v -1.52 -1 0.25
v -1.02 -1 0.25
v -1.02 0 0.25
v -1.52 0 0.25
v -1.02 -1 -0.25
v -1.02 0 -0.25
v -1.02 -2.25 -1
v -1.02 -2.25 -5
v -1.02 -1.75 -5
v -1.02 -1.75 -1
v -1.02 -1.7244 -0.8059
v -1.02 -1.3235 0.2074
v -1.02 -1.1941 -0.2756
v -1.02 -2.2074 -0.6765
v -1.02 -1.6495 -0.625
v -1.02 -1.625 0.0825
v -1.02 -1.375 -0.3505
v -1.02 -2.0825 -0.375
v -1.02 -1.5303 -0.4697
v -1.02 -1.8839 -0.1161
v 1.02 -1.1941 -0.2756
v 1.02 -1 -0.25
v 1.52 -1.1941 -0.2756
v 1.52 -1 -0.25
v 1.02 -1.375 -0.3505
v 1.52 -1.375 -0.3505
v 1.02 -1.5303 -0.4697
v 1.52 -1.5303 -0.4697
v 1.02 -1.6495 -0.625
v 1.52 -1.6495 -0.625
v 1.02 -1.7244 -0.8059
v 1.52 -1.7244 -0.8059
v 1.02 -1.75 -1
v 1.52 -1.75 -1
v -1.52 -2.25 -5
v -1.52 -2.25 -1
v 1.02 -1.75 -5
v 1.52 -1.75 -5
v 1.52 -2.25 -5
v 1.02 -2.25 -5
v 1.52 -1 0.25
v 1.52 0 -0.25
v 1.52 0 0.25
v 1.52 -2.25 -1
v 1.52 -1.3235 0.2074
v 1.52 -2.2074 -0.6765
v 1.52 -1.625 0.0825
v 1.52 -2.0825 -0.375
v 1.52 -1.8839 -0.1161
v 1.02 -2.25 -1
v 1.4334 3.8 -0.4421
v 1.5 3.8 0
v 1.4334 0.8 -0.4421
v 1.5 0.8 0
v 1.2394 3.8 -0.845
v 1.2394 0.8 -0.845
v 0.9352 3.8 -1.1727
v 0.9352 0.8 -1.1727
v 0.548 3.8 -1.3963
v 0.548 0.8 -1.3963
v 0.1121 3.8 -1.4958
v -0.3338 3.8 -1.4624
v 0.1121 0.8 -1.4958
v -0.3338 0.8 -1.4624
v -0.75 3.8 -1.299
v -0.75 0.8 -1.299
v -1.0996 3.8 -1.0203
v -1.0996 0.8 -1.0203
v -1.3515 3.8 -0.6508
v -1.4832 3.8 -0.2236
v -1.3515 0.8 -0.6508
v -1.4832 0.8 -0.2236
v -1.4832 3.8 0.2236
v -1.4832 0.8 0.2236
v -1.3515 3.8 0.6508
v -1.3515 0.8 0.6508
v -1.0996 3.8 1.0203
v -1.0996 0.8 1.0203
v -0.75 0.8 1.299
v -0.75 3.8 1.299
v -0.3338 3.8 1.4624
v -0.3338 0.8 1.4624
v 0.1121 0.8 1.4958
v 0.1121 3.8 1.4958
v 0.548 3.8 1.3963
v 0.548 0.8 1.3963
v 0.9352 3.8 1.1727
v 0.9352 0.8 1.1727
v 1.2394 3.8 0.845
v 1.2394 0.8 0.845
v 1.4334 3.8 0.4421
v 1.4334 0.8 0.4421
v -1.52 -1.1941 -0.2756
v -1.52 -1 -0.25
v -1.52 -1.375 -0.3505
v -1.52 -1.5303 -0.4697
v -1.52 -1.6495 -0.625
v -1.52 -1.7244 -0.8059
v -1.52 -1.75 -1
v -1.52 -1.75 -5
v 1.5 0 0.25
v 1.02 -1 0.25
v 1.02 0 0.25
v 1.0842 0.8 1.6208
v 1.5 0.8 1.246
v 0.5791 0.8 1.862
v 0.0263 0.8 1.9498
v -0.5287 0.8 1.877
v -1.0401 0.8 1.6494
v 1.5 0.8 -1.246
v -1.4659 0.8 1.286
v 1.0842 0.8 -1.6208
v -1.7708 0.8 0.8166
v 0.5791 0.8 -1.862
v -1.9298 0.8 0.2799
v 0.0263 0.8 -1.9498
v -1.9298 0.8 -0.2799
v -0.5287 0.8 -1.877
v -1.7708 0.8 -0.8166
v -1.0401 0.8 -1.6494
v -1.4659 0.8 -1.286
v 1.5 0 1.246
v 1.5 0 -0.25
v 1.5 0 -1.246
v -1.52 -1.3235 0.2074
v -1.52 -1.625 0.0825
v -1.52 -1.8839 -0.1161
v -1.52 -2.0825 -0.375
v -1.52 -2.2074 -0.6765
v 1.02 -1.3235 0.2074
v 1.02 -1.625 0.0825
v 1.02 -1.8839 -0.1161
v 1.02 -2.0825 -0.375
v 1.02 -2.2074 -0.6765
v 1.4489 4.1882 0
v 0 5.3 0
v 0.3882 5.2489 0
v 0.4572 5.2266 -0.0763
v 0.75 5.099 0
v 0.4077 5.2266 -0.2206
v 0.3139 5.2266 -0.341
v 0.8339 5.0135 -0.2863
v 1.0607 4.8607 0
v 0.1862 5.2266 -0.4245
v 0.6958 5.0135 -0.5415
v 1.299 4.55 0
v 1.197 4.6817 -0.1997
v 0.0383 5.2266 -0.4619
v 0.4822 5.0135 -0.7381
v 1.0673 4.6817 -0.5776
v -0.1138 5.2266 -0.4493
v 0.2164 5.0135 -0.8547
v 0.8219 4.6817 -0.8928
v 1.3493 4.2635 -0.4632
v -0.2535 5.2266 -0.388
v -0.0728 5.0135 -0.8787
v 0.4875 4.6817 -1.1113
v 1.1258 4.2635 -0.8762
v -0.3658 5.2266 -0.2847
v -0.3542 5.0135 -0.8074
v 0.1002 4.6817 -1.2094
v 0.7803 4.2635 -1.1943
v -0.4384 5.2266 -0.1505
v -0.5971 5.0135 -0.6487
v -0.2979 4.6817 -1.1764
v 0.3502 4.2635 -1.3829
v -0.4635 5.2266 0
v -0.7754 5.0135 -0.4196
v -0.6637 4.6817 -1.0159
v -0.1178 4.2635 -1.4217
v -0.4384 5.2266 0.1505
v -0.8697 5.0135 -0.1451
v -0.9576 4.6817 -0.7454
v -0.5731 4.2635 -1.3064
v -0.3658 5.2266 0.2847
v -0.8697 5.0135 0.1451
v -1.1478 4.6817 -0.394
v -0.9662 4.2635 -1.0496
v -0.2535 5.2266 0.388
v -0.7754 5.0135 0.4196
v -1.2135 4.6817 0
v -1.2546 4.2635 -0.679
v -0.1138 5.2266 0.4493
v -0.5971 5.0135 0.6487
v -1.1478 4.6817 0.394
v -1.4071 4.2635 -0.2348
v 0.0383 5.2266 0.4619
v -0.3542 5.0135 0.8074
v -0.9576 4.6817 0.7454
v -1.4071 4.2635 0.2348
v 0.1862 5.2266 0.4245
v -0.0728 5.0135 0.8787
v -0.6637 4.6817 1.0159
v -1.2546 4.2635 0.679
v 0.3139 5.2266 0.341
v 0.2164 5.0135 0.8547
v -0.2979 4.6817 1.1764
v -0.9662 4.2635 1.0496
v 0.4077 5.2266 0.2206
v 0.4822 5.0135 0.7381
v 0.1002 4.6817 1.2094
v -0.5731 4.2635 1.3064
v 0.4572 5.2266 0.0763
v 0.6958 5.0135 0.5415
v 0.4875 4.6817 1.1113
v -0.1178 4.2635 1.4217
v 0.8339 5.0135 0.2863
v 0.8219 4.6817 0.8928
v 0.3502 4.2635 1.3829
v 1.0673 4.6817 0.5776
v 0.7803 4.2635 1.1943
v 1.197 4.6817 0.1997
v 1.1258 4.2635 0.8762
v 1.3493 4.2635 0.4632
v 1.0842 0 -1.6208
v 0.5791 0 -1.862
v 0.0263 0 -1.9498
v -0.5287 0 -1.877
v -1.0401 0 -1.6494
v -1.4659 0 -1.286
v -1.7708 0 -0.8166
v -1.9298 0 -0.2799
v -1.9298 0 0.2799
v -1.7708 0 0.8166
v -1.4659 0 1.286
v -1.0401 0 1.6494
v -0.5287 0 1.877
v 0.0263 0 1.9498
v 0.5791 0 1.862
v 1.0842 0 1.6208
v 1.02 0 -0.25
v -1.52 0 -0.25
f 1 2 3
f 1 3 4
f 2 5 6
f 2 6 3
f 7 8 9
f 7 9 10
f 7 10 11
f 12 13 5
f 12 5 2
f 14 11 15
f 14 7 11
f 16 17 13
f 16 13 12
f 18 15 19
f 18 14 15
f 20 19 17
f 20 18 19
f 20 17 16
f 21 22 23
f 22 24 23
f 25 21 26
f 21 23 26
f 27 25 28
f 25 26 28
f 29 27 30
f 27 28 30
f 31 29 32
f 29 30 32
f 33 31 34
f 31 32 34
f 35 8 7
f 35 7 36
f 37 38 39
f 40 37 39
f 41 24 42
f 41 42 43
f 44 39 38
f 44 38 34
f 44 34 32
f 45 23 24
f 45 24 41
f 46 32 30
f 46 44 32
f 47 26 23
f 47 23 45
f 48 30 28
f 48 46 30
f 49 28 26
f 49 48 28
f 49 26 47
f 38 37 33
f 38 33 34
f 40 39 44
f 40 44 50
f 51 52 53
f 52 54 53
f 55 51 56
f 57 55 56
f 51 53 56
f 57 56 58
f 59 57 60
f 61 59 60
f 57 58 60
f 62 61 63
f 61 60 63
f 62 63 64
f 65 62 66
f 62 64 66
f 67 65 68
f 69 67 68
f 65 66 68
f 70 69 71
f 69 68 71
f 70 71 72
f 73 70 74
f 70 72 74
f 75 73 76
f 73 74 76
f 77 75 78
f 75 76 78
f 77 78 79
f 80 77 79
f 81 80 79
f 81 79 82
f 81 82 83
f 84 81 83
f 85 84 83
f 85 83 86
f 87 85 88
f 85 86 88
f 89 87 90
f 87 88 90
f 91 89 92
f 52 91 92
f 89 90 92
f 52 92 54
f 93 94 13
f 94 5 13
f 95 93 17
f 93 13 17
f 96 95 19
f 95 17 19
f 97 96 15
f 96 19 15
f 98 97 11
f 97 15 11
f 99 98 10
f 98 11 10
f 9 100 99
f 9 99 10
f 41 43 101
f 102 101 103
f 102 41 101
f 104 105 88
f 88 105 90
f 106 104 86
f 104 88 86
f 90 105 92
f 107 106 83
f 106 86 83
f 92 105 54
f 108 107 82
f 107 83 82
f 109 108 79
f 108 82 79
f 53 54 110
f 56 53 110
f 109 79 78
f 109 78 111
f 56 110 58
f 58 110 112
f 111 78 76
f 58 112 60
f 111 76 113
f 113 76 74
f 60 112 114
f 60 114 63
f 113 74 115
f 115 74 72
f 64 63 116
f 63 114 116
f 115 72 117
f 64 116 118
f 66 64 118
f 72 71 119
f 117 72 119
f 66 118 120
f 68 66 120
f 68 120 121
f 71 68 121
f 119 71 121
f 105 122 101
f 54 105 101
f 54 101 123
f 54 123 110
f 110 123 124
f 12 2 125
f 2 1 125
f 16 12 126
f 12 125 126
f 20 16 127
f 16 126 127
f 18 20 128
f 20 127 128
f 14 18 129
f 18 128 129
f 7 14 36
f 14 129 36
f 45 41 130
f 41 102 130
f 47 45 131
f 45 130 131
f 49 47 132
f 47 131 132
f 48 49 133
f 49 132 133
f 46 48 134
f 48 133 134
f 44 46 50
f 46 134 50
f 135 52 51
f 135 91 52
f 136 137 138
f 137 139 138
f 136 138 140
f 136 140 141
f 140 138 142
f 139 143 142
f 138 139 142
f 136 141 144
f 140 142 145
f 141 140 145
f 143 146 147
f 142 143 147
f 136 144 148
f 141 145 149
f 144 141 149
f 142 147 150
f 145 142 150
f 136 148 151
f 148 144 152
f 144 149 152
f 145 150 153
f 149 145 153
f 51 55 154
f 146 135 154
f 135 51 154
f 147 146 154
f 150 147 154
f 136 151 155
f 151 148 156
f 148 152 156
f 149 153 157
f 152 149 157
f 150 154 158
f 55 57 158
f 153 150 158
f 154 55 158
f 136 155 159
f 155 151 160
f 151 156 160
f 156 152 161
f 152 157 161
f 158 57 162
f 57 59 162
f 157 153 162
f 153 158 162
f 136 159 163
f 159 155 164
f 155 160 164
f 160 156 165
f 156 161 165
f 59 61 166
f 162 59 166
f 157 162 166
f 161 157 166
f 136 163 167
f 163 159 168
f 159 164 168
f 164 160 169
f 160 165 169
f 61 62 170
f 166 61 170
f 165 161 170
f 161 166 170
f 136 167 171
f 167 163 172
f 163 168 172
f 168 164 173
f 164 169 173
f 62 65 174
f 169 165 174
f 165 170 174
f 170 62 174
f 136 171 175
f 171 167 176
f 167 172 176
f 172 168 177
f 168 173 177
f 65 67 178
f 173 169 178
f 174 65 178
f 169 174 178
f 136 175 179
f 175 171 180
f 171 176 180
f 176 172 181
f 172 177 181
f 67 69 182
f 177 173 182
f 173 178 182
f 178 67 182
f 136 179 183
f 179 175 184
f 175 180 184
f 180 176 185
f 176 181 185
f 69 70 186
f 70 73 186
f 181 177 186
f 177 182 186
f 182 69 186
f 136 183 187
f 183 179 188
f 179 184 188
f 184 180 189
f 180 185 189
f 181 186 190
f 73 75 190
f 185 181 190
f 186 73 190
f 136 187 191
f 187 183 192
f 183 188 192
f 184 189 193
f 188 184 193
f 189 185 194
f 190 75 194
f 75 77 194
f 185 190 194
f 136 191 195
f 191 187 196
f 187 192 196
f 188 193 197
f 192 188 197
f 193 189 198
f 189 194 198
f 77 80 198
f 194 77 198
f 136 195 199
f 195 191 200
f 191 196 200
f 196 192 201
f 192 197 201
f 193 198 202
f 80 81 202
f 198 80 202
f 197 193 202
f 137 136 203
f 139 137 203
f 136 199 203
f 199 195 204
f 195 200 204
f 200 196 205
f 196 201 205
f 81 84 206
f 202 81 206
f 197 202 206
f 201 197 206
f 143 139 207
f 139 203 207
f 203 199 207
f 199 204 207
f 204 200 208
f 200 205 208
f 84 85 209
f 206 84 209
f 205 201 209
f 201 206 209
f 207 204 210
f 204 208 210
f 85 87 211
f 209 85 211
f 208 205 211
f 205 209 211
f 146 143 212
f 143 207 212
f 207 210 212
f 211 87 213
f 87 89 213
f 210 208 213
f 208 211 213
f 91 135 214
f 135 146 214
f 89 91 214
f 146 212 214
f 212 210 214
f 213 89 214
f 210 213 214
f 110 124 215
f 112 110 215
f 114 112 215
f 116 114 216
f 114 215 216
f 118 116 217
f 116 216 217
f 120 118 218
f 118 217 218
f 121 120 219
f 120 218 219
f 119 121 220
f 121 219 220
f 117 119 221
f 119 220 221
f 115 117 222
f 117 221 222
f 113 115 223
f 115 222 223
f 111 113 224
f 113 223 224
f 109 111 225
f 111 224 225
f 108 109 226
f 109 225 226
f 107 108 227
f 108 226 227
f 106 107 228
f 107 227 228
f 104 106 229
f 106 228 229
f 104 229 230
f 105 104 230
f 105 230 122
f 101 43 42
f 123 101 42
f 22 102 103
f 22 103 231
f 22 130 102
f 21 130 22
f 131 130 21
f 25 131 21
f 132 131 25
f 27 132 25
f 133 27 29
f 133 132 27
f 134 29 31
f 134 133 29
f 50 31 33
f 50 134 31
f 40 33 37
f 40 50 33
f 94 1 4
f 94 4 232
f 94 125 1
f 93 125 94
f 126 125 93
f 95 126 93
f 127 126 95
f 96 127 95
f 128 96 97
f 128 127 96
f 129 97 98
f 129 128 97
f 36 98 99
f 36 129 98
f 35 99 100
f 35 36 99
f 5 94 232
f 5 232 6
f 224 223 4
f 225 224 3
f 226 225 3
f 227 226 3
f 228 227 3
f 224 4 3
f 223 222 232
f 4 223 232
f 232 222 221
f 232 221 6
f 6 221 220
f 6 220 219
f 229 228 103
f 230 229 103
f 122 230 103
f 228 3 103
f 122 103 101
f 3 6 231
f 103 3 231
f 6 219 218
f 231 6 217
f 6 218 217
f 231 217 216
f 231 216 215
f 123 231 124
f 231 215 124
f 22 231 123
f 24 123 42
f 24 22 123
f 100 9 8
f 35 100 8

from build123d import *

# Parameters (mm, degrees)
SKETCH2_W          = 0.45
SKETCH2_H          = 2.491987158
CUT_EXTRUDE1_DEPTH = 6.97452927
SKETCH3_W          = 0.5
SKETCH3_H          = 0.5


with BuildPart() as part:
    # Sketch1 → Revolve1 (revolve)
    with BuildSketch(Plane(origin=(0, 0, 0), x_dir=(1, 0, 0), z_dir=(0, 0, -1))):
        with BuildLine():
            Line((0, 0), (0, -5.3))
            ThreePointArc((0, -5.3), (1.060660172, -4.860660172), (1.5, -3.8))
            Line((1.5, -3.8), (1.5, -0.8))
            Line((1.5, -0.8), (1.95, -0.8))
            Line((1.95, -0.8), (1.95, 0))
            Line((1.95, 0), (0, 0))
        make_face()
    revolve(axis=Axis((0, 0, 0), (0, 1, 0)))

    # Sketch2 → Cut-Extrude1 (cut, through all)
    with BuildSketch(Plane(origin=(0, 0, 0), x_dir=(-1, 0, 0), z_dir=(0, -1, 0))):
        with Locations((-1.725, 0)):
            Rectangle(SKETCH2_W, SKETCH2_H)
    extrude(amount=-CUT_EXTRUDE1_DEPTH, mode=Mode.SUBTRACT)

    # Sweep1: sweep along a path in Sketch4
    with BuildLine(Plane(origin=(-1.27, 0, 0), x_dir=(0, 0, -1), z_dir=(1, 0, 0))) as sweep1_path:
        Line((0, 0), (0, -1))
        ThreePointArc((0, -1), (0.292893219, -1.707106781), (1, -2))
        Line((1, -2), (5, -2))
    # Sketch3 → Sweep1 (sweep)
    with BuildSketch(Plane(origin=(0, 0, 0), x_dir=(-1, 0, 0), z_dir=(0, -1, 0))):
        with Locations((-1.27, 0)):
            Rectangle(SKETCH3_W, SKETCH3_H)
        with Locations((1.27, 0)):
            Rectangle(SKETCH3_W, SKETCH3_H)
    sweep(path=sweep1_path.line)


solid = part.part
